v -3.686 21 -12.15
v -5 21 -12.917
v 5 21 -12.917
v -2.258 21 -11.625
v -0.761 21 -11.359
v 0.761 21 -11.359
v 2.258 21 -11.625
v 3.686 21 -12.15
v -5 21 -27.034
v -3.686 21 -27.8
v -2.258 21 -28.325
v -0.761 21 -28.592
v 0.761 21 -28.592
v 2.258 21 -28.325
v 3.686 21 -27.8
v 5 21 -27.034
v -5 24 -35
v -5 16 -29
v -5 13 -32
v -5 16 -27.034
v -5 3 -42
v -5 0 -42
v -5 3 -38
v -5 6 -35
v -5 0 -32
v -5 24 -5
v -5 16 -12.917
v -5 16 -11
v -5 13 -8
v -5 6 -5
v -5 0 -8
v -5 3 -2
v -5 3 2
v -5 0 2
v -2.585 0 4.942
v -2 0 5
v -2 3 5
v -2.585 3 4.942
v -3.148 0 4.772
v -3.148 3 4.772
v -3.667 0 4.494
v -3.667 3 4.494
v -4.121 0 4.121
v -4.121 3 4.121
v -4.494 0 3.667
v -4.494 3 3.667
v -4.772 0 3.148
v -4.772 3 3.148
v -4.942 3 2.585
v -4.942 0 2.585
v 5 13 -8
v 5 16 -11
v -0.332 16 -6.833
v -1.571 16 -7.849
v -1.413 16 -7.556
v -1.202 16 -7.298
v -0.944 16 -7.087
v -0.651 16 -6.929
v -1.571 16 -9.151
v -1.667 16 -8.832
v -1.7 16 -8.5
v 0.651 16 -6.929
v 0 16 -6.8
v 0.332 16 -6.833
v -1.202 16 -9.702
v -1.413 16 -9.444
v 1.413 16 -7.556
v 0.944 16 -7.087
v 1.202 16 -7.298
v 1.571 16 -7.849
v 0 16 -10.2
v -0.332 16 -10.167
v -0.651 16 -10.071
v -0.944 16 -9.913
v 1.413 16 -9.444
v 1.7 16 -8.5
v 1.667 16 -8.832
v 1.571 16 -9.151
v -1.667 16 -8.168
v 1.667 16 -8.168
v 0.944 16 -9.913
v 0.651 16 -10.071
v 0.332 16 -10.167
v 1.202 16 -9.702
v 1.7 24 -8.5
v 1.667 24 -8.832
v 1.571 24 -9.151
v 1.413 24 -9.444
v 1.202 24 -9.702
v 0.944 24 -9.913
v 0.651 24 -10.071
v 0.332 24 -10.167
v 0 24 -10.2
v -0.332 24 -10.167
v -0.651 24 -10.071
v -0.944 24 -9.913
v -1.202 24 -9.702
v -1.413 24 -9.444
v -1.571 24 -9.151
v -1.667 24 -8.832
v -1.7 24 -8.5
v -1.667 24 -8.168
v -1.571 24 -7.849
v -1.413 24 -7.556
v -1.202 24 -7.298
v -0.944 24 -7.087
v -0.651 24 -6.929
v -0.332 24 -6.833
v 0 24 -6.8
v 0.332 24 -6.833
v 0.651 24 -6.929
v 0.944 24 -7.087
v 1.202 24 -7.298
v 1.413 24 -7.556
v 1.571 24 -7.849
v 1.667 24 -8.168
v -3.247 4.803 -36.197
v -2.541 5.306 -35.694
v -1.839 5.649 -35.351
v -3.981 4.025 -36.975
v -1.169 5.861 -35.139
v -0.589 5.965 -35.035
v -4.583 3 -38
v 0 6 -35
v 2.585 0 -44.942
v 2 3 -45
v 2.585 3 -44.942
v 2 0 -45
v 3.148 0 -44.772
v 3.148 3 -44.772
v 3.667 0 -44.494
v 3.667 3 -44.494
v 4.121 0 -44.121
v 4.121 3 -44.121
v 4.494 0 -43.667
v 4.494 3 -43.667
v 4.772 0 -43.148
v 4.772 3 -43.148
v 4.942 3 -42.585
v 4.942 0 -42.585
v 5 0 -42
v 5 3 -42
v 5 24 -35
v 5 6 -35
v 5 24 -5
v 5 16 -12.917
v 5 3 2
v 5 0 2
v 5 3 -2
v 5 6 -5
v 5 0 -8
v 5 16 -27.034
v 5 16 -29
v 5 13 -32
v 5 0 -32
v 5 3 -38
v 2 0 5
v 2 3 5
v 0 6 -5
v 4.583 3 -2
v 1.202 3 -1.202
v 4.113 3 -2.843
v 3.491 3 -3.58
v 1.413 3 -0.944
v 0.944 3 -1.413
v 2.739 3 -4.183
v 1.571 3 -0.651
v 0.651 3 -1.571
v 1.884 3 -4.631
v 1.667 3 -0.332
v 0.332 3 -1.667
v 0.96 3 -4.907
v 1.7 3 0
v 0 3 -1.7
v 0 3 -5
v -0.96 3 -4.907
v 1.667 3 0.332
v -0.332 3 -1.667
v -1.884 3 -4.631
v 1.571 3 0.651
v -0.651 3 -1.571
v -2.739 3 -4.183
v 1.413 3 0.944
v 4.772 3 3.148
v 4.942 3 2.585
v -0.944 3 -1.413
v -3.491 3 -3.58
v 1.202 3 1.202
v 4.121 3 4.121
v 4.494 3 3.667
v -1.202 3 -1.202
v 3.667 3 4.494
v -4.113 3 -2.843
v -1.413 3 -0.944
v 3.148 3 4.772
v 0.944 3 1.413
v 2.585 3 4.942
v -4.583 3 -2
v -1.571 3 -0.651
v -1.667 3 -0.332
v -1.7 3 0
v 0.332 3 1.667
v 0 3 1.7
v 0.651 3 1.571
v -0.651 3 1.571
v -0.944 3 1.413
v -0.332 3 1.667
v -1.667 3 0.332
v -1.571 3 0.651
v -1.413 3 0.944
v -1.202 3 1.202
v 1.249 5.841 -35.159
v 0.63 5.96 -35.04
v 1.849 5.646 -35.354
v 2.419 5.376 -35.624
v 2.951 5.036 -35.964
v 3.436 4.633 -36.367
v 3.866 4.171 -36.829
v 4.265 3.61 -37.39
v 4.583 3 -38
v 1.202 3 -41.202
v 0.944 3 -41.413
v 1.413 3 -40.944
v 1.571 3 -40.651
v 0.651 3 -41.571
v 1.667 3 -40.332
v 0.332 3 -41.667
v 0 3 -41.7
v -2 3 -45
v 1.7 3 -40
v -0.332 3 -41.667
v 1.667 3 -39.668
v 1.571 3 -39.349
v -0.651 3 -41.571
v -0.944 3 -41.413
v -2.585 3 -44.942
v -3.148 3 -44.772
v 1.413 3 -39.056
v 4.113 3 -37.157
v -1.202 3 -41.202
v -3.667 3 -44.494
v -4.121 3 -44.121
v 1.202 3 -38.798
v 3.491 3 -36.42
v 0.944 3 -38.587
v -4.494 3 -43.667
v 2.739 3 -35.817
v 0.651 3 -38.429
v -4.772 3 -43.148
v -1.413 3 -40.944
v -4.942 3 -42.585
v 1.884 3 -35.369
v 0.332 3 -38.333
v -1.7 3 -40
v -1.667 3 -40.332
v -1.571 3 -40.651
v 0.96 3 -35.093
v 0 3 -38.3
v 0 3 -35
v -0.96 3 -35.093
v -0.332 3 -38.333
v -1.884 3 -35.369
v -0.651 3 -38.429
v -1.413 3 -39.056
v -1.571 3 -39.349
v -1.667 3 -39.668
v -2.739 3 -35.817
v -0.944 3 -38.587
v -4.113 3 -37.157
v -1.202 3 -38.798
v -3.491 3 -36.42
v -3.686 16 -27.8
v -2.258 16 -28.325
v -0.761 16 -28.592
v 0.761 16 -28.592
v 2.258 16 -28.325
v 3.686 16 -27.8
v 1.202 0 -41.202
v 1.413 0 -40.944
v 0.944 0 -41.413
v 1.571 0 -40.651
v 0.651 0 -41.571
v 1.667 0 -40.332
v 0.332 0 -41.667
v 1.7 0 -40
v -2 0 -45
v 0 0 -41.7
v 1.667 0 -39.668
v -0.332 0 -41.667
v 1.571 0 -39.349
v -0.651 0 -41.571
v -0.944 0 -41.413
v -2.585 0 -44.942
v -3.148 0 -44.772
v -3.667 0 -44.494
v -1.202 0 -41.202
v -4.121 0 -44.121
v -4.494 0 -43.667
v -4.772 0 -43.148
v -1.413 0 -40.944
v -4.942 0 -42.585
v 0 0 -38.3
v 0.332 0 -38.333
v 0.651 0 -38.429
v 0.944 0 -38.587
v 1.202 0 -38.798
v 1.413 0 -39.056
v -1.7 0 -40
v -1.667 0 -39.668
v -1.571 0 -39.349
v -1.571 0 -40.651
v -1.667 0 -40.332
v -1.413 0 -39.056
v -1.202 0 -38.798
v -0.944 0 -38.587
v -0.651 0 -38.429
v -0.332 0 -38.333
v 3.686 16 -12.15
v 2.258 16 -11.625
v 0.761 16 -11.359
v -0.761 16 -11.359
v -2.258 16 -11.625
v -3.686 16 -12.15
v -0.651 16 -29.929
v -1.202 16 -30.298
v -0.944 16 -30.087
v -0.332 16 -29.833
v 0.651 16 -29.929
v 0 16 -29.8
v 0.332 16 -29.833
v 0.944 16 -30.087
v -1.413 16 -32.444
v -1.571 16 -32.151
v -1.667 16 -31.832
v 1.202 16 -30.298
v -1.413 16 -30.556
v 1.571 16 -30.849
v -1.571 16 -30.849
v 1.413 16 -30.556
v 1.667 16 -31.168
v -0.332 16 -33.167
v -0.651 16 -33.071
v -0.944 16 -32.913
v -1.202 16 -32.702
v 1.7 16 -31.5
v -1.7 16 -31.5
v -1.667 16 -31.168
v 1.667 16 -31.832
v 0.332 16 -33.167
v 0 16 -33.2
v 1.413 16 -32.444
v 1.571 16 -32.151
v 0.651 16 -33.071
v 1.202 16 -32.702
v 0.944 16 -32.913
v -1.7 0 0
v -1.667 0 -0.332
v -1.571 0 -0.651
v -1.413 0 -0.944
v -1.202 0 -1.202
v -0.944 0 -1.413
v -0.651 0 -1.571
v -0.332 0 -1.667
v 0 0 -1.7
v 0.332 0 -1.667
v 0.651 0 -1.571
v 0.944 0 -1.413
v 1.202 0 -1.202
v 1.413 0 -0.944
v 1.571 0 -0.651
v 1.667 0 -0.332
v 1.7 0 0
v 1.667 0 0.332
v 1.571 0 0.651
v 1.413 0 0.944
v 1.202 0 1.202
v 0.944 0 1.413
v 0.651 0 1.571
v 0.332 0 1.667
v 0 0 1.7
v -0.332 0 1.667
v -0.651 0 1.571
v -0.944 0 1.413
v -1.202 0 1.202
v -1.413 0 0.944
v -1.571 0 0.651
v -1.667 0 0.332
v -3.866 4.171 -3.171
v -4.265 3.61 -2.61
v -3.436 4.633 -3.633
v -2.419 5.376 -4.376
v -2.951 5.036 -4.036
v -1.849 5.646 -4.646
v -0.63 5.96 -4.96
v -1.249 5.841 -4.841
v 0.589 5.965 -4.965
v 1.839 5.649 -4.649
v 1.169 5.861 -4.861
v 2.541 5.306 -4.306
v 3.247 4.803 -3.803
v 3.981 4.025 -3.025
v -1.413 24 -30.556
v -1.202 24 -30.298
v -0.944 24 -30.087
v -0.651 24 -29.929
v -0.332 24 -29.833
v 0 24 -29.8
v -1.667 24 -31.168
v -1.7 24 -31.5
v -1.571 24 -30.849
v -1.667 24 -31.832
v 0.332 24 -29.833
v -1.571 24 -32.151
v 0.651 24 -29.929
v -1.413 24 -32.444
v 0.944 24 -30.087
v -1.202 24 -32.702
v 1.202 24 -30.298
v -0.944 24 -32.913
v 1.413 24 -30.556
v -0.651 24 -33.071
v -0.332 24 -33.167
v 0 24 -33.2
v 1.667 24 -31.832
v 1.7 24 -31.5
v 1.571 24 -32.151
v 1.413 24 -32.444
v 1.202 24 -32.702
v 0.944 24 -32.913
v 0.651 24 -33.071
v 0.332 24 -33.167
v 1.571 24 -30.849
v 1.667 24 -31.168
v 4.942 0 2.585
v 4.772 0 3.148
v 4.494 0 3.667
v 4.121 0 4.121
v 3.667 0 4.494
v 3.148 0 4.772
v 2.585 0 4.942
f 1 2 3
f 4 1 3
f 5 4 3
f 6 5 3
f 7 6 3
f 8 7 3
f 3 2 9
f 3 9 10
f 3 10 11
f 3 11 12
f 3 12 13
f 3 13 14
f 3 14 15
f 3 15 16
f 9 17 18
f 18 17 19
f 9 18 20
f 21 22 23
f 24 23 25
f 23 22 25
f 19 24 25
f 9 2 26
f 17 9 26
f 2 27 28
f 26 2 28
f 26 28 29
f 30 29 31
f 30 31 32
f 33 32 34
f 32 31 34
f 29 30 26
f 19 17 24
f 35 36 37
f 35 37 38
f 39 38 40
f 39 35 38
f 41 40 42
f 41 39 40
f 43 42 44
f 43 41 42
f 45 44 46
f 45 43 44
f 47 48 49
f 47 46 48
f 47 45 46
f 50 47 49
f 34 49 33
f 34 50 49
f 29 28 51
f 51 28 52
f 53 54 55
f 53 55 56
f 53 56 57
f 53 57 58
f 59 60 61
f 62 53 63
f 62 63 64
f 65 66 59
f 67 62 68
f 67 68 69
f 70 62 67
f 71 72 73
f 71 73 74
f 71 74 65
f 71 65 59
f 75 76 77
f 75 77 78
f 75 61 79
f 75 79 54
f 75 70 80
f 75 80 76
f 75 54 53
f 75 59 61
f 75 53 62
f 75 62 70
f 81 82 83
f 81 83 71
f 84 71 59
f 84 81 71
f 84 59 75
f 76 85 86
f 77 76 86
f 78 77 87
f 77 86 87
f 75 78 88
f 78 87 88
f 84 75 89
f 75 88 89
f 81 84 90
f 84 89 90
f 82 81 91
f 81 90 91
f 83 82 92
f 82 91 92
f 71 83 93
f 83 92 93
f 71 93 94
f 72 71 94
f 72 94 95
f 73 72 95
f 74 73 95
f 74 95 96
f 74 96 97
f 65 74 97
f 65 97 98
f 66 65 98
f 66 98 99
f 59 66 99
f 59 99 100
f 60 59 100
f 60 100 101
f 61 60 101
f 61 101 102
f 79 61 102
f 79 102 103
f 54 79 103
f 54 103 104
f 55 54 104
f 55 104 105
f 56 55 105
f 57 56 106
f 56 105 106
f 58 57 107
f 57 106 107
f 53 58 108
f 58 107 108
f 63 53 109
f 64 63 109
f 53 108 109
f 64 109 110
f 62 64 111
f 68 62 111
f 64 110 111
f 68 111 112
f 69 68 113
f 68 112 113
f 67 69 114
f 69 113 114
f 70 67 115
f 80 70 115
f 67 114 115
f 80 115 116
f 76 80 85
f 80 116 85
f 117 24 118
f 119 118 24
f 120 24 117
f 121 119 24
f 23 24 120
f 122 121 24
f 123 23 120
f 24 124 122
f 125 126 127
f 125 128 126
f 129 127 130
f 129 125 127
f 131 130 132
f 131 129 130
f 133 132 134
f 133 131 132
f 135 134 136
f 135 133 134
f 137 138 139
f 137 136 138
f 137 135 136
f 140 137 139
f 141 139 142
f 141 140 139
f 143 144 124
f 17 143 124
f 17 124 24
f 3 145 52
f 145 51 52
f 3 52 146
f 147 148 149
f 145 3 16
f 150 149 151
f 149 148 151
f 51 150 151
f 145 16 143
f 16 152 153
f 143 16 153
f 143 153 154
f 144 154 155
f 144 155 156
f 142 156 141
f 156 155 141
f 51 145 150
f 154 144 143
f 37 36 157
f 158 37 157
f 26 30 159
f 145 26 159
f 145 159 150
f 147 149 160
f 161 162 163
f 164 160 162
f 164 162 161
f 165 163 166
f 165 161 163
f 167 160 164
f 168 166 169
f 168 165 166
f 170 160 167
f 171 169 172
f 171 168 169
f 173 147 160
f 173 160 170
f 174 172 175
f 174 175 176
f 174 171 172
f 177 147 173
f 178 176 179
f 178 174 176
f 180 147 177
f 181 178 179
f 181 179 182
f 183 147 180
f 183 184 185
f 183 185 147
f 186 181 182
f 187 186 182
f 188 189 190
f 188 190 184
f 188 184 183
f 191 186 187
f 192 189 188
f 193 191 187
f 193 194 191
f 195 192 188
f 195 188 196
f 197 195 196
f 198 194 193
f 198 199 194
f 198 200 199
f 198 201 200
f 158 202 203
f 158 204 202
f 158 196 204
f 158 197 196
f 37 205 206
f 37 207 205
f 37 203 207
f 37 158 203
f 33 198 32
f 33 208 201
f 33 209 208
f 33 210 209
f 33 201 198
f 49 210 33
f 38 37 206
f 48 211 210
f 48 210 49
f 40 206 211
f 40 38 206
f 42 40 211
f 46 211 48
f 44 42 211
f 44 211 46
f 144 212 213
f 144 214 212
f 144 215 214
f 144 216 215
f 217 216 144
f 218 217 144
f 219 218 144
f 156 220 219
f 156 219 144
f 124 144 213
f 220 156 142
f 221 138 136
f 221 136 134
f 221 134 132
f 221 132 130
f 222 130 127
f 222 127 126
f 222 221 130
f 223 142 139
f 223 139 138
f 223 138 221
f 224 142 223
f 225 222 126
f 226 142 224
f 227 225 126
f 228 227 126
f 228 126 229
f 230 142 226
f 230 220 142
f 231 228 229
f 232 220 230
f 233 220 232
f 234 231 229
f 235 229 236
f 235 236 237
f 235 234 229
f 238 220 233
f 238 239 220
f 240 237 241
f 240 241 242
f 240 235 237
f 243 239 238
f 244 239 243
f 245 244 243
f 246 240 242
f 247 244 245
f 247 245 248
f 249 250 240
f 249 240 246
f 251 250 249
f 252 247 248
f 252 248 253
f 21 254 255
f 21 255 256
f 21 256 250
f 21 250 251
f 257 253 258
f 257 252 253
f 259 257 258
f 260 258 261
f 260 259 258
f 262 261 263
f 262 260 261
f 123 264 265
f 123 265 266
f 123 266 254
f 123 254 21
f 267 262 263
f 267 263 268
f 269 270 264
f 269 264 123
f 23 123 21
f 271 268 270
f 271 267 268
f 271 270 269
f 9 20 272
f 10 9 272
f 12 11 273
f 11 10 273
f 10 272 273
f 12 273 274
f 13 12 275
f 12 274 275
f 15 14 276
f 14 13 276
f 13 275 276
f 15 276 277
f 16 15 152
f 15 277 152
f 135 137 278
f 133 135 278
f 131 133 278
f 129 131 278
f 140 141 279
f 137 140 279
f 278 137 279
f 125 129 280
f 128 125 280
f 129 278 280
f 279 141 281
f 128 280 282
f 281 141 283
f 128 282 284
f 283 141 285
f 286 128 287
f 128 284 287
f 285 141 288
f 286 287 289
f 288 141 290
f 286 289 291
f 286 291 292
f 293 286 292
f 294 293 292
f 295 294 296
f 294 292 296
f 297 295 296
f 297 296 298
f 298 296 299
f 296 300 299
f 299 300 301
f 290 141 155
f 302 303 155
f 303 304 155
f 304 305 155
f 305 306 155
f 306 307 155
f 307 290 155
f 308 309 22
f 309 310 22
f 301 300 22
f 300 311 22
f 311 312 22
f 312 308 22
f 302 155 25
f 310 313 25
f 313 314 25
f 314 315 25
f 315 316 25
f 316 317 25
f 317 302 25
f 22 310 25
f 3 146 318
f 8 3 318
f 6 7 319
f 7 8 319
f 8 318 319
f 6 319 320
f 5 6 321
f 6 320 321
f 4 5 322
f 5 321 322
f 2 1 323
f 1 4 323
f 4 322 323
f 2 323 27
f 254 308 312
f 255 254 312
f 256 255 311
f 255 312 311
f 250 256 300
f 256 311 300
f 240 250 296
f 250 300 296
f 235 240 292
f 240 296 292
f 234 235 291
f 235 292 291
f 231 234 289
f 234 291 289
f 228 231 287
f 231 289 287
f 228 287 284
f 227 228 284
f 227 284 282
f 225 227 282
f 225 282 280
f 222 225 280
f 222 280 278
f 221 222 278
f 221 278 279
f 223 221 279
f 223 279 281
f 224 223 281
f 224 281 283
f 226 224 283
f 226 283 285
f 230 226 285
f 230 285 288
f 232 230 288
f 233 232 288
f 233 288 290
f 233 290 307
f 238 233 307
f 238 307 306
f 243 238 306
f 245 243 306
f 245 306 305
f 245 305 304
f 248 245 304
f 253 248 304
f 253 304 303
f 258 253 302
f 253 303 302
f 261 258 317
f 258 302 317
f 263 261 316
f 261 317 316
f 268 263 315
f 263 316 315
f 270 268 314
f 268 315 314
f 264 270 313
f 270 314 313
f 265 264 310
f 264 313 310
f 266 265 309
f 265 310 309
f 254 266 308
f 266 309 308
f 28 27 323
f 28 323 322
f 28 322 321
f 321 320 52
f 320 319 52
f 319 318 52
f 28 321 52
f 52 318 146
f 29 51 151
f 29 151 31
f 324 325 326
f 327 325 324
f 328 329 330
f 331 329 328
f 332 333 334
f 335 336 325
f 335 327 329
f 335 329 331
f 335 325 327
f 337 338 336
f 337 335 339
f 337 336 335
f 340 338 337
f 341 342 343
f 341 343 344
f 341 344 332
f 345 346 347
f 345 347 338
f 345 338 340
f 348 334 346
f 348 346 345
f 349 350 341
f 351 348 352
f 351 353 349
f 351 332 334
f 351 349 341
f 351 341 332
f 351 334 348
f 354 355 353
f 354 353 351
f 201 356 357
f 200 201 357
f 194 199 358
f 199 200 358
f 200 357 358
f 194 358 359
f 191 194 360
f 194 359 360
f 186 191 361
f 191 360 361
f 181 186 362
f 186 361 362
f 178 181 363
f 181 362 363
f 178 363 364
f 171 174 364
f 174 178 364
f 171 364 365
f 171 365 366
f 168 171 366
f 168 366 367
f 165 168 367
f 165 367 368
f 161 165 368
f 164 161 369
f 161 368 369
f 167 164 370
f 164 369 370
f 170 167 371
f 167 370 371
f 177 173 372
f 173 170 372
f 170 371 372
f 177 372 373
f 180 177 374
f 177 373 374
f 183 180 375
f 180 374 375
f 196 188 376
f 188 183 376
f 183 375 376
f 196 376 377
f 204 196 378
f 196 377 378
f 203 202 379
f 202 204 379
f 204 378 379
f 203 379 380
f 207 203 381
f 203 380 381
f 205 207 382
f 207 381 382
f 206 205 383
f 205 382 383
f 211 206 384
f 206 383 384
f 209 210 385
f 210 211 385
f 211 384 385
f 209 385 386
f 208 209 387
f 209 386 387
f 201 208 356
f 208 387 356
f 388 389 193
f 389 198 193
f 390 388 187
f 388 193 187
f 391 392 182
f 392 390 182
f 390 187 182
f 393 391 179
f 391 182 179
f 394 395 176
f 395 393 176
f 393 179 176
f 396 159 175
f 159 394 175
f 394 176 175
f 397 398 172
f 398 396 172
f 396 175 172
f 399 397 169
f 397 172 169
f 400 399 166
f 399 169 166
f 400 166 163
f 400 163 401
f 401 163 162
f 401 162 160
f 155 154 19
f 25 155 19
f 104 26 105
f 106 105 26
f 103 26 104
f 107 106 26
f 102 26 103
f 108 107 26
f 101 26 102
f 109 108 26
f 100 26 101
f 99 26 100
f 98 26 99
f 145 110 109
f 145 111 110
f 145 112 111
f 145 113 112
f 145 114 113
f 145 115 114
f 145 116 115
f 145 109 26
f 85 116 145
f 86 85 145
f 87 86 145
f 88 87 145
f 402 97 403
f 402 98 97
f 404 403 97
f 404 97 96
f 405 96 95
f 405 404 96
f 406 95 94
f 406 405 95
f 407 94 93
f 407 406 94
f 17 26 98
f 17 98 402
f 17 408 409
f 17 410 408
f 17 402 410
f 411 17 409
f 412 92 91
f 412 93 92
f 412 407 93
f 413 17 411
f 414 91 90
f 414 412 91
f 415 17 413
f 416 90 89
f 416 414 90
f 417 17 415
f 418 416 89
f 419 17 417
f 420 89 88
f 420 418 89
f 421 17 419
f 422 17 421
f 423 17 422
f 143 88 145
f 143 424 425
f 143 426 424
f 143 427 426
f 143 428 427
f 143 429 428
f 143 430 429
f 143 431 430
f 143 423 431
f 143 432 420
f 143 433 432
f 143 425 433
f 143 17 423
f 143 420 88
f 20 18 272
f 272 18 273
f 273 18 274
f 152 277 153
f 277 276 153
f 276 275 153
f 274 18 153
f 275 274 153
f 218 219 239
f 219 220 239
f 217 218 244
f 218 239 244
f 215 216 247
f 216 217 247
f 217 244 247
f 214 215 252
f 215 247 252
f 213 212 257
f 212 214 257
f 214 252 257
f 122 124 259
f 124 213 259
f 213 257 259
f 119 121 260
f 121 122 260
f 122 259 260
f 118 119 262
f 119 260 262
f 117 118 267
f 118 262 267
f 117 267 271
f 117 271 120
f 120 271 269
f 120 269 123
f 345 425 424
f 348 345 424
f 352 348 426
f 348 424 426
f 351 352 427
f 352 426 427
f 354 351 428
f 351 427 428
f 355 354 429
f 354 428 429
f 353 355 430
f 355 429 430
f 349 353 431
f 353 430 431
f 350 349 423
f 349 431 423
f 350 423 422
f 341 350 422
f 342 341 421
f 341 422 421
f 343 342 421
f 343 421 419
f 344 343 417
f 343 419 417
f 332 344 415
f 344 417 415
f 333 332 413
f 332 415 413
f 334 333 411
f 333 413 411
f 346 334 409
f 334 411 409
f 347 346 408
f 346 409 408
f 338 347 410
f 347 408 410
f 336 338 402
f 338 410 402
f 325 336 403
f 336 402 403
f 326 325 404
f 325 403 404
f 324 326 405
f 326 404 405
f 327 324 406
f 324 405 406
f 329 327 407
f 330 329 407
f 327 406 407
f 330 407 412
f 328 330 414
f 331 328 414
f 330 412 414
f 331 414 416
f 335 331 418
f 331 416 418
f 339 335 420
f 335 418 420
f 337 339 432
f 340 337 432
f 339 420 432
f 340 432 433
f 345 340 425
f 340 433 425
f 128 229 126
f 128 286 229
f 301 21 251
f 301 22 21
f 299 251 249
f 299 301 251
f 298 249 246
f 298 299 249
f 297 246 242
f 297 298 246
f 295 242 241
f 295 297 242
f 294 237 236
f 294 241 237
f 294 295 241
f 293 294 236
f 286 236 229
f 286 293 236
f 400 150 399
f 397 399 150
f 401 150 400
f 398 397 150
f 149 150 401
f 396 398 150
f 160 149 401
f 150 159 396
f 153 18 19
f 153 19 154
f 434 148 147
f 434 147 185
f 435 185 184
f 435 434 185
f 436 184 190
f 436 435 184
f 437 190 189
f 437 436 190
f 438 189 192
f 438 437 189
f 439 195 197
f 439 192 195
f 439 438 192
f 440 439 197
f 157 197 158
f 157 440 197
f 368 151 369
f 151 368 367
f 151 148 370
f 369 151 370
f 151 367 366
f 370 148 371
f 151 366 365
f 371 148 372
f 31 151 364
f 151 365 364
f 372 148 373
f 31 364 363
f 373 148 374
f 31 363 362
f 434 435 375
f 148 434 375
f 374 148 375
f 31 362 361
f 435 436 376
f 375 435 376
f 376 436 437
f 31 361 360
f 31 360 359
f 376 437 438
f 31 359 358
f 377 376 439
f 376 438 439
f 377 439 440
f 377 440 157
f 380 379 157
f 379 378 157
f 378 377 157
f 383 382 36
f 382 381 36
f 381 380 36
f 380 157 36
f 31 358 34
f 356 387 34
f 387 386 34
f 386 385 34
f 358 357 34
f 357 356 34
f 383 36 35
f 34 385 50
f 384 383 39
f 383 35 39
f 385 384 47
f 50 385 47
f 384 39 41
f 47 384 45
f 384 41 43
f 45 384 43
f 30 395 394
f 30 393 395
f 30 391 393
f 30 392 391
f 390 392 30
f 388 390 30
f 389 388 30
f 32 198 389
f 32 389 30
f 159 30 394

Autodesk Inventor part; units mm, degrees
ref_plane "YZ Plane" through (0, 0, 0) normal (1, 0, 0) x (0, 1, 0)
ref_plane "XZ Plane" through (0, 0, 0) normal (0, 1, 0) x (-1, 0, 0)
ref_plane "XY Plane" through (0, 0, 0) normal (0, 0, 1) x (1, 0, 0)
sketch "Sketch1" plane through (0, 0, 0) normal (0, 1, 0) x (-1, 0, 0)
  line L0 (0, 0) -> (0, -40) construction
  circle A0 centre (0, 0) radius 1.7
  circle A1 centre (0, -40) radius 1.7
  line L1 (-5, -5) -> (5, -5)
  line L2 (5, -5) -> (5, 2)
  line L3 (2, 5) -> (-2, 5)
  line L4 (-5, 2) -> (-5, -5)
  line L5 (-5, -5) -> (5, 5) construction
  line L6 (5, -5) -> (-5, 5) construction
  line L7 (-5, -35) -> (5, -35)
  line L8 (5, -35) -> (5, -42)
  line L9 (2, -45) -> (-2, -45)
  line L10 (-5, -42) -> (-5, -35)
  line L11 (-5, -35) -> (5, -45) construction
  line L12 (5, -35) -> (-5, -45) construction
  arc A2 (5, 2) -> (2, 5) centre (2, 2) ccw
  arc A3 (-2, 5) -> (-5, 2) centre (-2, 2) ccw
  arc A4 (-5, -42) -> (-2, -45) centre (-2, -42) ccw
  arc A5 (2, -45) -> (5, -42) centre (2, -42) ccw
  line L13 (5, -5) -> (5, -35)
  line L14 (-5, -5) -> (-5, -35)
  line L15 (5, -5) -> (-5, -5)
  line L16 (-5, -5) -> (-5, -8)
  line L17 (-5, -8) -> (5, -8)
  line L18 (5, -8) -> (5, -5)
  line L19 (5, -35) -> (-5, -35)
  line L20 (-5, -35) -> (-5, -32)
  line L21 (-5, -32) -> (5, -32)
  line L22 (5, -32) -> (5, -35)
  dimension "d0" = 40
  dimension "d1" = 3.4
  dimension "d2" = 3.4
  dimension "d3" = 10
  dimension "d4" = 10
  dimension "d5" = 10
  dimension "d6" = 10
  dimension "d7" = 3
  dimension "d10" = 3
  dimension "d11" = 3
extrude "Extrusion1" add sketch "Sketch1" along normal blind 3 contours L4 A3 L3 A2 L2 L1 | L7 L8 A5 L9 A4 L10
extrude "Extrusion2" add sketch "Sketch1" along normal blind 16 contours L1 L13 L17 L14 | L21 L13 L7 L14
sketch "Sketch2" plane through (0, 16, 0) normal (0, 1, 0) x (1, 0, 0)
  line L0 (0, 7.9504) -> (0, 32) construction
  line L1 (-5, 32) -> (5, 32) projected
  circle A0 centre (0, 19.9752) radius 8.65
  line L2 (-5, 5) -> (5, 5)
  line L3 (5, 5) -> (5, 12.9167)
  line L4 (5, 12.9167) -> (-5, 12.9167)
  line L5 (-5, 12.9167) -> (-5, 5)
  line L6 (-5, 42) -> (-5, 35) projected
  line L7 (-5, 35) -> (5, 35)
  line L8 (5, 35) -> (5, 27.0337)
  line L9 (5, 27.0337) -> (-5, 27.0337)
  line L10 (-5, 27.0337) -> (-5, 35)
  point P0 (0, 0)
  dimension "d14" = 17.3
extrude "Extrusion3" add sketch "Sketch2" along normal blind 5 contours L10 L7 L8 L1 | L1 L8 A0 L10 | A0 L3 L2 L5
sketch "Sketch3" plane through (0, 21, 0) normal (0, 1, 0) x (1, 0, 0)
  line L0 (-5, 5) -> (-5, -2) projected
  line L1 (5, 35) -> (5, 42) projected
  line L2 (-5, 5) -> (5, 5)
  line L3 (5, 5) -> (5, 35)
  line L4 (5, 35) -> (-5, 35)
  line L5 (-5, 35) -> (-5, 5)
  point P0 (0, 0)
extrude "Extrusion4" add sketch "Sketch3" along normal blind 3
chamfer "Chamfer2" distance 3 angle 45 4 edges at (0, 16, -8) (0, 16, -32) (0, 3, -35) (0, 3, -5)
sketch "Sketch5" plane through (0, 24, 0) normal (0, 1, 0) x (1, 0, 0)
  line L0 (5, 35) -> (-5, 35) construction
  line L1 (0, 35) -> (0, 5) construction
  line L2 (-5, 5) -> (5, 5) construction
  circle A0 centre (0, 31.5) radius 1.7
  circle A1 centre (0, 8.5) radius 1.7
  point P0 (0, 0)
  dimension "d29" = 3.4
  dimension "d30" = 3.4
  dimension "d31" = 3.5
  dimension "d32" = 3.5
extrude "Extrusion6" cut sketch "Sketch5" against normal blind 8
sketch "Sketch6" plane through (0, 3, 0) normal (0, 1, 0) x (1, 0, 0)
  circle A0 centre (0, 0) radius 5
  circle A1 centre (0, 40) radius 1.7 projected
  circle A2 centre (0, 40) radius 5
  dimension "d35" = 10
  dimension "d36" = 10
extrude "Extrusion7" cut sketch "Sketch6" along normal blind 10
properties part number "Small Gear Bracket"
